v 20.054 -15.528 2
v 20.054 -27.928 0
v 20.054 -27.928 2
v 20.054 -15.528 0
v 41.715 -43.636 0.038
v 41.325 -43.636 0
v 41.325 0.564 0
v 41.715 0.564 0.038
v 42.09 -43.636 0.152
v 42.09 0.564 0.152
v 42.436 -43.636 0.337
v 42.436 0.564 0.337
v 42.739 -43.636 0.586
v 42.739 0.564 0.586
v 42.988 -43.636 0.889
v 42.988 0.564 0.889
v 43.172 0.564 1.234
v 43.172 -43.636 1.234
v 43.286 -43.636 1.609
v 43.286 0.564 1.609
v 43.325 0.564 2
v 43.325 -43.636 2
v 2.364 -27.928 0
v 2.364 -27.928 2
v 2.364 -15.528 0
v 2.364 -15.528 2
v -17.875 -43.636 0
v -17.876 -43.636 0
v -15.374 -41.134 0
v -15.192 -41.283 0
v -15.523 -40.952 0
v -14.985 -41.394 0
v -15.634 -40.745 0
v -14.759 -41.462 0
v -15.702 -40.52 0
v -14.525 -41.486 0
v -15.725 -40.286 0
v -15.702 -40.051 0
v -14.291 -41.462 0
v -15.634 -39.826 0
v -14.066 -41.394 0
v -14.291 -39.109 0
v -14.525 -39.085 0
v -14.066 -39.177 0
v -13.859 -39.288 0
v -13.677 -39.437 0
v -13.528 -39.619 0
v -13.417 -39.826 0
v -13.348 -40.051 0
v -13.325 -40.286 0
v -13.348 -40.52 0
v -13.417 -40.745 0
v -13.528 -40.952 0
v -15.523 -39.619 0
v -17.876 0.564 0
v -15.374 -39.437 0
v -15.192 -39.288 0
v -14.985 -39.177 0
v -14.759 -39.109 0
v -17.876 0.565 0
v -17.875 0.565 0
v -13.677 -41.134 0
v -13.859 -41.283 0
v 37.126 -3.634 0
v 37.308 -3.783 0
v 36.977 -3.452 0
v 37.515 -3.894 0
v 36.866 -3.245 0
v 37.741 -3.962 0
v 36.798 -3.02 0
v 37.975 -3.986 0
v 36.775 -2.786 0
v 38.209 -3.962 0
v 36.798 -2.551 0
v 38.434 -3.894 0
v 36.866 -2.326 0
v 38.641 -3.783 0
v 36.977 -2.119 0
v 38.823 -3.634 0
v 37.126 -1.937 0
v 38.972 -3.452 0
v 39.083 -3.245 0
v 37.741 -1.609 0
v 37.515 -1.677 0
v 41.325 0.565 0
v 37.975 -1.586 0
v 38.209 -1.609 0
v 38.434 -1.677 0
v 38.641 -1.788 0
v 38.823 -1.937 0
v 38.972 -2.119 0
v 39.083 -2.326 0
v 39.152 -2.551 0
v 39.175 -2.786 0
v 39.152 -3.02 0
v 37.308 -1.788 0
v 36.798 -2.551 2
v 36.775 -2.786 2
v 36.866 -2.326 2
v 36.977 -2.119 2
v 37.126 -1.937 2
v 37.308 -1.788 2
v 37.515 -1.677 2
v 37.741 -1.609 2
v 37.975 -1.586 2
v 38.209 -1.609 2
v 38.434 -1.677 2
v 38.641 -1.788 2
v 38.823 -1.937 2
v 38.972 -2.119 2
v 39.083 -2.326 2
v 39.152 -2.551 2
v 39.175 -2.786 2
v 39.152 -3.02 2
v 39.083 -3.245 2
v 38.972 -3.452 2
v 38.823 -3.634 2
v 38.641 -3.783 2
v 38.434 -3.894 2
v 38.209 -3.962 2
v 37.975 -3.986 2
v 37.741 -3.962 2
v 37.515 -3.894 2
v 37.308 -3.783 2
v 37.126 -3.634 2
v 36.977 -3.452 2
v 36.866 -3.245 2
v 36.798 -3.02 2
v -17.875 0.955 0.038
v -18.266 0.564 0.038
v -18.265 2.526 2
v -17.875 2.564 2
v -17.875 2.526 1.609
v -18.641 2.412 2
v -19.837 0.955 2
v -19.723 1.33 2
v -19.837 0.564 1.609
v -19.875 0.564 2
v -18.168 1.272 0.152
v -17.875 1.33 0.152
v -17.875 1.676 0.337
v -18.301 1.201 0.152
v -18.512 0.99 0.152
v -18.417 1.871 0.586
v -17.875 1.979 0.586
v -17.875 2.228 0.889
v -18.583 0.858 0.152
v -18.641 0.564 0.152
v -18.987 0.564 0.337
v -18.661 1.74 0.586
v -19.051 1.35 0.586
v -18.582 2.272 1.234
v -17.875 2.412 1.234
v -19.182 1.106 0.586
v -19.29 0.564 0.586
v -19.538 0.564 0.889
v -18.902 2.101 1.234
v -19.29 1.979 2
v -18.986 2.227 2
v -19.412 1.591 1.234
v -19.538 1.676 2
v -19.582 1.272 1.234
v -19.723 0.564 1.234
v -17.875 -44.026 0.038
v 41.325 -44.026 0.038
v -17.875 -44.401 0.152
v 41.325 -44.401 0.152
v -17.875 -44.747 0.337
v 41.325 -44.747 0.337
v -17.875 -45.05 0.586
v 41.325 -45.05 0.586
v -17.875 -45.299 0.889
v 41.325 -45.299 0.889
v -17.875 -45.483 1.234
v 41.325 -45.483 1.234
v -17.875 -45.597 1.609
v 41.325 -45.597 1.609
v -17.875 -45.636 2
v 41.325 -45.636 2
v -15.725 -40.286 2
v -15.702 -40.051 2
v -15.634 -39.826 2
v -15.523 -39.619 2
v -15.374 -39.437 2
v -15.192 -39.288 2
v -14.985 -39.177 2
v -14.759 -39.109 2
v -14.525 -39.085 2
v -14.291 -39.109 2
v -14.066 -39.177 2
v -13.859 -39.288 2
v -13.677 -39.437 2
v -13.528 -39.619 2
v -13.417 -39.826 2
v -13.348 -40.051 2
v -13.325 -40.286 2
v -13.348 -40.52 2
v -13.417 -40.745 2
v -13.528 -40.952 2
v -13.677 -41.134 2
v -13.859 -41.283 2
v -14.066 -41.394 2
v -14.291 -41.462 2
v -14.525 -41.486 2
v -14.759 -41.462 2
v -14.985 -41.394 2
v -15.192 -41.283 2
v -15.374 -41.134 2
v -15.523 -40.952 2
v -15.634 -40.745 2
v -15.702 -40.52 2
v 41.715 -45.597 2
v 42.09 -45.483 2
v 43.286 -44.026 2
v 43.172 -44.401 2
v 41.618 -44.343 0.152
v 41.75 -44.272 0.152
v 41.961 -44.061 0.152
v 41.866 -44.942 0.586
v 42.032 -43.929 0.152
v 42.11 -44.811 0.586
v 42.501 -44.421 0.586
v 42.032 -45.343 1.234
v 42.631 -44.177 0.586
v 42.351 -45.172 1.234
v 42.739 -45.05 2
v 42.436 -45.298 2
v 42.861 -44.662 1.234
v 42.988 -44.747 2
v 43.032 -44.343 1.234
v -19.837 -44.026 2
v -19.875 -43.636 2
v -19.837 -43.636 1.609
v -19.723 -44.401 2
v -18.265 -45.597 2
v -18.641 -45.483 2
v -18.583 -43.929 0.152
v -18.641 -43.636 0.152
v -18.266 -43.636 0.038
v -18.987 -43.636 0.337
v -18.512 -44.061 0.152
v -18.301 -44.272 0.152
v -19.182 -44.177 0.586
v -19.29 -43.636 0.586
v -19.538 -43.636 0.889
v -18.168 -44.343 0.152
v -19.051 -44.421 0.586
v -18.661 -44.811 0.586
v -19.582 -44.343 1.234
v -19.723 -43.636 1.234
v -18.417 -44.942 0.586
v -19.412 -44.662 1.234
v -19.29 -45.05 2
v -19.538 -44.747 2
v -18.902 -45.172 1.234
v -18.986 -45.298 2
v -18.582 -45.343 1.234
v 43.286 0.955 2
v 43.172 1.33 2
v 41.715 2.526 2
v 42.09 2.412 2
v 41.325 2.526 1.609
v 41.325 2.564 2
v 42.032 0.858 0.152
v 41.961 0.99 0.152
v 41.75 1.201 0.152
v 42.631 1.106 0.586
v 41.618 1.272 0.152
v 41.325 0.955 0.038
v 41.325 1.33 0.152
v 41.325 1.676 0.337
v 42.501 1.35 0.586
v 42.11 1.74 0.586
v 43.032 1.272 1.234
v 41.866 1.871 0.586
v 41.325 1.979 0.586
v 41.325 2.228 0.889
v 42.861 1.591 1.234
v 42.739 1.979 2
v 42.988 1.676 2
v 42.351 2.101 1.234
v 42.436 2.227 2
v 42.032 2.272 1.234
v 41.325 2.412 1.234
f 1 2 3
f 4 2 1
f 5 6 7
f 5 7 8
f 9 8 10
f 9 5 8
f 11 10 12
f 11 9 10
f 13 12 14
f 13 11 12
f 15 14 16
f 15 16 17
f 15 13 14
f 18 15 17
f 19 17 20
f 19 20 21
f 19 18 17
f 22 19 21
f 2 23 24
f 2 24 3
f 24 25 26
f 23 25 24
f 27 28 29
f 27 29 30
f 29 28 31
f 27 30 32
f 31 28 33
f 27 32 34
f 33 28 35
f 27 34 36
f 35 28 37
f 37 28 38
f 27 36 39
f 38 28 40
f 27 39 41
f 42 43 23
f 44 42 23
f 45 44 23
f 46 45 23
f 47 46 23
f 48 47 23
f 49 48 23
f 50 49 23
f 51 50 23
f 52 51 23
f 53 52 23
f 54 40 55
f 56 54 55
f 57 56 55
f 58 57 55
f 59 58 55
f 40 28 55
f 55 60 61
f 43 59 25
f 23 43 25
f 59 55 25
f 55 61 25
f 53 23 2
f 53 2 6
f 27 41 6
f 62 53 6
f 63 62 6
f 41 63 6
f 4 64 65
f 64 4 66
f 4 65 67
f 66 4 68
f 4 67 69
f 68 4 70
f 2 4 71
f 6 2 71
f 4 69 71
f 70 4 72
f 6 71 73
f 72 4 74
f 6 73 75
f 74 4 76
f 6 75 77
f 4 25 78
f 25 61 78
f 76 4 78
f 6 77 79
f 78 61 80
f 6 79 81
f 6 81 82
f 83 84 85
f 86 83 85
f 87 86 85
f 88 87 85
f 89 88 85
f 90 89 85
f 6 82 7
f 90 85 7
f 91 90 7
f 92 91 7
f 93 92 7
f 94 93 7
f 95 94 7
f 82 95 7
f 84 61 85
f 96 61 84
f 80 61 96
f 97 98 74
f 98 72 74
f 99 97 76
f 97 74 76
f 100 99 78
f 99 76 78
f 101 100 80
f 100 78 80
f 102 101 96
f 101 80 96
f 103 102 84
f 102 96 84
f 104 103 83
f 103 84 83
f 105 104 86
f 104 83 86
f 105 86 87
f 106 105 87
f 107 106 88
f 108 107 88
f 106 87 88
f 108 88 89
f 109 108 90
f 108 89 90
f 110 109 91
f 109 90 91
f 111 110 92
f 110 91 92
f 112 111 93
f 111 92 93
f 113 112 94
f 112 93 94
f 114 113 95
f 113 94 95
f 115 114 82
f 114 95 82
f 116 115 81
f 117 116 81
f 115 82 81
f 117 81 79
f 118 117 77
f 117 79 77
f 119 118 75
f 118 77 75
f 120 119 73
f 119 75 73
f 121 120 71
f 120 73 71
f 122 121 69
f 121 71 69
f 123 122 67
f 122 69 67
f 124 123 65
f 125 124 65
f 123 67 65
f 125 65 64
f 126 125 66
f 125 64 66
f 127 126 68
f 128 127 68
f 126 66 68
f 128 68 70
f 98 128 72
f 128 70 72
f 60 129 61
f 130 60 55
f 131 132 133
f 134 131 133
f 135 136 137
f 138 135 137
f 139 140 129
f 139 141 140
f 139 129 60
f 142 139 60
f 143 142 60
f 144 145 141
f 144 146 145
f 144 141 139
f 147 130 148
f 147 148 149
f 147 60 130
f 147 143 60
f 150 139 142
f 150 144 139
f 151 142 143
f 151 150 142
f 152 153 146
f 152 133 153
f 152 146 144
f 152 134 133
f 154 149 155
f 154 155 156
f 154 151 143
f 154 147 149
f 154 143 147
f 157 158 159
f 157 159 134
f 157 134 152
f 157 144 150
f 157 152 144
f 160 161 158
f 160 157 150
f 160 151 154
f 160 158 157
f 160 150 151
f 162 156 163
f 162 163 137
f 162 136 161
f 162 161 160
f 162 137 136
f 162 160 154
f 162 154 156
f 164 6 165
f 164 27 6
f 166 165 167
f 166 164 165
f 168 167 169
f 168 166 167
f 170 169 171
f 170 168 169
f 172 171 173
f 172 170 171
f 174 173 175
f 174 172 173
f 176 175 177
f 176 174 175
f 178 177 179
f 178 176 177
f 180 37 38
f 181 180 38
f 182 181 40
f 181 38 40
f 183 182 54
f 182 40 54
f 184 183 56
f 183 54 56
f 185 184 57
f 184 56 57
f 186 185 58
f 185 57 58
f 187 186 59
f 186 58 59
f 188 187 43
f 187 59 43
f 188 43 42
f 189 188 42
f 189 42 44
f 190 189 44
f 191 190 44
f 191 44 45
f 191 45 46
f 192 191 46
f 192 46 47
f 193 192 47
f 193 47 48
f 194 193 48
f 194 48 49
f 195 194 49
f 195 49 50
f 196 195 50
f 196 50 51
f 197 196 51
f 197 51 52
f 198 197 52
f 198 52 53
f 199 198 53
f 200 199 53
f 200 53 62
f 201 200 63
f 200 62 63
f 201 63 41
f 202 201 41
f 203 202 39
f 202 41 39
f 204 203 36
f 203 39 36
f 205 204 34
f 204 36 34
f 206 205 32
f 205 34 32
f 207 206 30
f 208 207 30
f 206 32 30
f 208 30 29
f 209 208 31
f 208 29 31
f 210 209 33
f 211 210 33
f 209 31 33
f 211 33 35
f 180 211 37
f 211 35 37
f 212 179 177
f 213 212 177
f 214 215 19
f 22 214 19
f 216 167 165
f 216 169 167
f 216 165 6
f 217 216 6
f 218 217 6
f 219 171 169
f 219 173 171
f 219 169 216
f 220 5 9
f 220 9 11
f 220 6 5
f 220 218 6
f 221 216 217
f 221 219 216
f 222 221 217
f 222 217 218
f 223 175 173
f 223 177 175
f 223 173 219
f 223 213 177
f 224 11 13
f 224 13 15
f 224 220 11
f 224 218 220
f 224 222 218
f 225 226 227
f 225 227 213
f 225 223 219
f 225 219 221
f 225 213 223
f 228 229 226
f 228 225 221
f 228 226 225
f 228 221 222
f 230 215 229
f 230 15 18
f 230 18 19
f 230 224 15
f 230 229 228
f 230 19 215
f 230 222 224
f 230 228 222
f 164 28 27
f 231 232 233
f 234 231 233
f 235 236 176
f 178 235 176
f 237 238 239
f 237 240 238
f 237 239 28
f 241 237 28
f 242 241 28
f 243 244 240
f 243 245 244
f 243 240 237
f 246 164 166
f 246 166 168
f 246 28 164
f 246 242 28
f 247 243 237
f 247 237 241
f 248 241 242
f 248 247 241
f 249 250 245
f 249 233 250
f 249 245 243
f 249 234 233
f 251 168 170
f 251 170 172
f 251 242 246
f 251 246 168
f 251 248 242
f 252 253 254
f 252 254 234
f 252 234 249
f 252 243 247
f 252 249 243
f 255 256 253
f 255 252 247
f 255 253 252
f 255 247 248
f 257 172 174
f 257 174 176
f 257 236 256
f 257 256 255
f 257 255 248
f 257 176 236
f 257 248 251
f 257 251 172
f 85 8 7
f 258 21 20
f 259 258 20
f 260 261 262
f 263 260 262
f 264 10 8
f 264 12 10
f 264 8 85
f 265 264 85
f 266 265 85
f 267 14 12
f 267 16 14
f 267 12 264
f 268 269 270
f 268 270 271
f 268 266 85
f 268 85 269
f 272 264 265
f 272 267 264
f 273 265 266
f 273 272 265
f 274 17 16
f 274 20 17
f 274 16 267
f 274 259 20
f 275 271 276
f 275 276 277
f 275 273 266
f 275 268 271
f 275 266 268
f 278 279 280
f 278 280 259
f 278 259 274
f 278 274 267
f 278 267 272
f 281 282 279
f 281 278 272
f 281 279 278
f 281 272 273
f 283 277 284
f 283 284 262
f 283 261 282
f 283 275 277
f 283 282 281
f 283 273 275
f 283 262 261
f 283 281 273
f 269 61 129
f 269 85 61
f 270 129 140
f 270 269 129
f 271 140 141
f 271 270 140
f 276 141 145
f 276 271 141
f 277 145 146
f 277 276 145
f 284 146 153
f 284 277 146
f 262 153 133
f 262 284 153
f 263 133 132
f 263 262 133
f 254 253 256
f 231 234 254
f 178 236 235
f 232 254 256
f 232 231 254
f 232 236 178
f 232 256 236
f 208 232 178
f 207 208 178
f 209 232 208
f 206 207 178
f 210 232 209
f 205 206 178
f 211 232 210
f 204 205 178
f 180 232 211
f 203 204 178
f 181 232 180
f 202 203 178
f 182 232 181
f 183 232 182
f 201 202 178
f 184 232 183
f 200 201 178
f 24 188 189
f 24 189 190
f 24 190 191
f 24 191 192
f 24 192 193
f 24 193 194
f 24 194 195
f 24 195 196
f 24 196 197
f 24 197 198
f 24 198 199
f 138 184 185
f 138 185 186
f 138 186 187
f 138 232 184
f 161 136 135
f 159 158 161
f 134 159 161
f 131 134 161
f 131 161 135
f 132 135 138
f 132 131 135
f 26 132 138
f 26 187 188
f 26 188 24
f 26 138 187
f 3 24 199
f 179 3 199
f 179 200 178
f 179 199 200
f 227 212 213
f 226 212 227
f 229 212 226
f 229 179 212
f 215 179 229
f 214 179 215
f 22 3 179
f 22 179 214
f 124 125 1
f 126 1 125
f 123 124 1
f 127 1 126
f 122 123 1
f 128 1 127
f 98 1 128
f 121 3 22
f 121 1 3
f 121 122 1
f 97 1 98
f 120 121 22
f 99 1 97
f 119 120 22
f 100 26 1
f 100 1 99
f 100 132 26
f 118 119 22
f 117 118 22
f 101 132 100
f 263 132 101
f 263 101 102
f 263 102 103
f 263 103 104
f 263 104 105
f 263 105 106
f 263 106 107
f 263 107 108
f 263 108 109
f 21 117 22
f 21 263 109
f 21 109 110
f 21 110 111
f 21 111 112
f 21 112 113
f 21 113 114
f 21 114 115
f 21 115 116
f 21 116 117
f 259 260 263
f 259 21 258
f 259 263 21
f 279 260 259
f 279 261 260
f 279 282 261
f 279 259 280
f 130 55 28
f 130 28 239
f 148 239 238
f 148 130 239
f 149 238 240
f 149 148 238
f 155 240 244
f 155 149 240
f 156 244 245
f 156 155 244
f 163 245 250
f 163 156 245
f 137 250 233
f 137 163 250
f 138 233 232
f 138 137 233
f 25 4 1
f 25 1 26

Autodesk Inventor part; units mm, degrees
ref_plane "YZ Plane" through (0, 0, 0) normal (1, 0, 0) x (0, 1, 0)
ref_plane "XZ Plane" through (0, 0, 0) normal (0, 1, 0) x (-1, 0, 0)
ref_plane "XY Plane" through (0, 0, 0) normal (0, 0, 1) x (1, 0, 0)
sketch "Sketch1" plane through (0, 0, 0) normal (0, 0, 1) x (1, 0, 0)
  line L0 (-19.8753, 2.5645) -> (43.3247, 2.5645)
  line L1 (43.3247, 2.5645) -> (43.3247, -45.6355)
  line L2 (43.3247, -45.6355) -> (-19.8753, -45.6355)
  line L3 (-19.8753, -45.6355) -> (-19.8753, 2.5645)
  circle A0 centre (37.9747, -2.7855) radius 2.1
  circle A1 centre (-14.5253, -40.2855) radius 2.1
  circle A2 centre (37.9747, -2.7855) radius 1.2
  circle A3 centre (-14.5253, -40.2855) radius 1.2
  point P0 (0, 0)
  dimension "d0" = 63.2
  dimension "d1" = 48.2
  dimension "d6" = 4.2
  dimension "d7" = 4.2
  dimension "d8" = 5.35
  dimension "d9" = 5.35
  dimension "d10" = 5.35
  dimension "d11" = 5.35
  dimension "d12" = 2.4
  dimension "d13" = 2.4
extrude "Extrusion1" add sketch "Sketch1" along normal blind 2 contours L0 L1 L2 L3 | A0 | A1 | A2 | A3
fillet "Fillet1" radius 2 2 edges at (-19.8753, 2.5645, 1) (-19.8753, -45.6355, 1)
fillet "Fillet2" radius 2 2 edges at (43.3247, 2.5645, 1) (43.3247, -45.6355, 1)
sketch "Sketch2" plane through (0, 0, 0) normal (0, 0, -1) x (-1, 0, 0)
  circle A0 centre (14.5253, -40.2855) radius 2.1
  circle A1 centre (-37.9747, -2.7855) radius 2.1
  circle A2 centre (14.5253, -40.2855) radius 1.2
  circle A3 centre (-37.9747, -2.7855) radius 1.2
  line L0 (17.8753, -45.6355) -> (-41.3247, -45.6355) projected
  line L1 (19.8753, 0.5645) -> (19.8753, -43.6355) projected
  line L2 (-43.3247, -43.6355) -> (-43.3247, 0.5645) projected
  line L3 (-41.3247, 2.5645) -> (17.8753, 2.5645) projected
  point P0 (0, 0)
  dimension "d14" = 4.2
  dimension "d15" = 4.2
  dimension "d16" = 2.4
  dimension "d17" = 2.4
  dimension "d18" = 5.35
  dimension "d19" = 5.35
  dimension "d20" = 5.35
  dimension "d21" = 5.35
extrude "Extrusion3" cut sketch "Sketch2" against normal blind 2.2 contours A2 | A3
fillet "Fillet3" radius 2 8 edges at (42.7389, -45.0497, 0) (43.3247, -21.5355, 0) (42.7389, 1.9787, 0) (11.7247, 2.5645, 0) (-19.2896, 1.9787, 0) (-19.8753, -21.5355, 0) (-19.2896, -45.0497, 0) (11.7247, -45.6355, 0)
sketch "Sketch4" plane through (0, 0, 0) normal (0, 0, -1) x (-1, 0, 0)
  line L0 (-2.3639, -27.9277) -> (-20.0539, -27.9277)
  line L1 (-20.0539, -27.9277) -> (-20.0539, -15.5277)
  line L2 (-20.0539, -15.5277) -> (-2.3639, -15.5277)
  line L3 (-2.3639, -15.5277) -> (-2.3639, -27.9277)
  point P0 (0, 0)
  dimension "d27" = 17.69
  dimension "d28" = 12.4
extrude "Extrusion4" cut sketch "Sketch4" against normal blind 2.2
properties part number "limb_cover"
